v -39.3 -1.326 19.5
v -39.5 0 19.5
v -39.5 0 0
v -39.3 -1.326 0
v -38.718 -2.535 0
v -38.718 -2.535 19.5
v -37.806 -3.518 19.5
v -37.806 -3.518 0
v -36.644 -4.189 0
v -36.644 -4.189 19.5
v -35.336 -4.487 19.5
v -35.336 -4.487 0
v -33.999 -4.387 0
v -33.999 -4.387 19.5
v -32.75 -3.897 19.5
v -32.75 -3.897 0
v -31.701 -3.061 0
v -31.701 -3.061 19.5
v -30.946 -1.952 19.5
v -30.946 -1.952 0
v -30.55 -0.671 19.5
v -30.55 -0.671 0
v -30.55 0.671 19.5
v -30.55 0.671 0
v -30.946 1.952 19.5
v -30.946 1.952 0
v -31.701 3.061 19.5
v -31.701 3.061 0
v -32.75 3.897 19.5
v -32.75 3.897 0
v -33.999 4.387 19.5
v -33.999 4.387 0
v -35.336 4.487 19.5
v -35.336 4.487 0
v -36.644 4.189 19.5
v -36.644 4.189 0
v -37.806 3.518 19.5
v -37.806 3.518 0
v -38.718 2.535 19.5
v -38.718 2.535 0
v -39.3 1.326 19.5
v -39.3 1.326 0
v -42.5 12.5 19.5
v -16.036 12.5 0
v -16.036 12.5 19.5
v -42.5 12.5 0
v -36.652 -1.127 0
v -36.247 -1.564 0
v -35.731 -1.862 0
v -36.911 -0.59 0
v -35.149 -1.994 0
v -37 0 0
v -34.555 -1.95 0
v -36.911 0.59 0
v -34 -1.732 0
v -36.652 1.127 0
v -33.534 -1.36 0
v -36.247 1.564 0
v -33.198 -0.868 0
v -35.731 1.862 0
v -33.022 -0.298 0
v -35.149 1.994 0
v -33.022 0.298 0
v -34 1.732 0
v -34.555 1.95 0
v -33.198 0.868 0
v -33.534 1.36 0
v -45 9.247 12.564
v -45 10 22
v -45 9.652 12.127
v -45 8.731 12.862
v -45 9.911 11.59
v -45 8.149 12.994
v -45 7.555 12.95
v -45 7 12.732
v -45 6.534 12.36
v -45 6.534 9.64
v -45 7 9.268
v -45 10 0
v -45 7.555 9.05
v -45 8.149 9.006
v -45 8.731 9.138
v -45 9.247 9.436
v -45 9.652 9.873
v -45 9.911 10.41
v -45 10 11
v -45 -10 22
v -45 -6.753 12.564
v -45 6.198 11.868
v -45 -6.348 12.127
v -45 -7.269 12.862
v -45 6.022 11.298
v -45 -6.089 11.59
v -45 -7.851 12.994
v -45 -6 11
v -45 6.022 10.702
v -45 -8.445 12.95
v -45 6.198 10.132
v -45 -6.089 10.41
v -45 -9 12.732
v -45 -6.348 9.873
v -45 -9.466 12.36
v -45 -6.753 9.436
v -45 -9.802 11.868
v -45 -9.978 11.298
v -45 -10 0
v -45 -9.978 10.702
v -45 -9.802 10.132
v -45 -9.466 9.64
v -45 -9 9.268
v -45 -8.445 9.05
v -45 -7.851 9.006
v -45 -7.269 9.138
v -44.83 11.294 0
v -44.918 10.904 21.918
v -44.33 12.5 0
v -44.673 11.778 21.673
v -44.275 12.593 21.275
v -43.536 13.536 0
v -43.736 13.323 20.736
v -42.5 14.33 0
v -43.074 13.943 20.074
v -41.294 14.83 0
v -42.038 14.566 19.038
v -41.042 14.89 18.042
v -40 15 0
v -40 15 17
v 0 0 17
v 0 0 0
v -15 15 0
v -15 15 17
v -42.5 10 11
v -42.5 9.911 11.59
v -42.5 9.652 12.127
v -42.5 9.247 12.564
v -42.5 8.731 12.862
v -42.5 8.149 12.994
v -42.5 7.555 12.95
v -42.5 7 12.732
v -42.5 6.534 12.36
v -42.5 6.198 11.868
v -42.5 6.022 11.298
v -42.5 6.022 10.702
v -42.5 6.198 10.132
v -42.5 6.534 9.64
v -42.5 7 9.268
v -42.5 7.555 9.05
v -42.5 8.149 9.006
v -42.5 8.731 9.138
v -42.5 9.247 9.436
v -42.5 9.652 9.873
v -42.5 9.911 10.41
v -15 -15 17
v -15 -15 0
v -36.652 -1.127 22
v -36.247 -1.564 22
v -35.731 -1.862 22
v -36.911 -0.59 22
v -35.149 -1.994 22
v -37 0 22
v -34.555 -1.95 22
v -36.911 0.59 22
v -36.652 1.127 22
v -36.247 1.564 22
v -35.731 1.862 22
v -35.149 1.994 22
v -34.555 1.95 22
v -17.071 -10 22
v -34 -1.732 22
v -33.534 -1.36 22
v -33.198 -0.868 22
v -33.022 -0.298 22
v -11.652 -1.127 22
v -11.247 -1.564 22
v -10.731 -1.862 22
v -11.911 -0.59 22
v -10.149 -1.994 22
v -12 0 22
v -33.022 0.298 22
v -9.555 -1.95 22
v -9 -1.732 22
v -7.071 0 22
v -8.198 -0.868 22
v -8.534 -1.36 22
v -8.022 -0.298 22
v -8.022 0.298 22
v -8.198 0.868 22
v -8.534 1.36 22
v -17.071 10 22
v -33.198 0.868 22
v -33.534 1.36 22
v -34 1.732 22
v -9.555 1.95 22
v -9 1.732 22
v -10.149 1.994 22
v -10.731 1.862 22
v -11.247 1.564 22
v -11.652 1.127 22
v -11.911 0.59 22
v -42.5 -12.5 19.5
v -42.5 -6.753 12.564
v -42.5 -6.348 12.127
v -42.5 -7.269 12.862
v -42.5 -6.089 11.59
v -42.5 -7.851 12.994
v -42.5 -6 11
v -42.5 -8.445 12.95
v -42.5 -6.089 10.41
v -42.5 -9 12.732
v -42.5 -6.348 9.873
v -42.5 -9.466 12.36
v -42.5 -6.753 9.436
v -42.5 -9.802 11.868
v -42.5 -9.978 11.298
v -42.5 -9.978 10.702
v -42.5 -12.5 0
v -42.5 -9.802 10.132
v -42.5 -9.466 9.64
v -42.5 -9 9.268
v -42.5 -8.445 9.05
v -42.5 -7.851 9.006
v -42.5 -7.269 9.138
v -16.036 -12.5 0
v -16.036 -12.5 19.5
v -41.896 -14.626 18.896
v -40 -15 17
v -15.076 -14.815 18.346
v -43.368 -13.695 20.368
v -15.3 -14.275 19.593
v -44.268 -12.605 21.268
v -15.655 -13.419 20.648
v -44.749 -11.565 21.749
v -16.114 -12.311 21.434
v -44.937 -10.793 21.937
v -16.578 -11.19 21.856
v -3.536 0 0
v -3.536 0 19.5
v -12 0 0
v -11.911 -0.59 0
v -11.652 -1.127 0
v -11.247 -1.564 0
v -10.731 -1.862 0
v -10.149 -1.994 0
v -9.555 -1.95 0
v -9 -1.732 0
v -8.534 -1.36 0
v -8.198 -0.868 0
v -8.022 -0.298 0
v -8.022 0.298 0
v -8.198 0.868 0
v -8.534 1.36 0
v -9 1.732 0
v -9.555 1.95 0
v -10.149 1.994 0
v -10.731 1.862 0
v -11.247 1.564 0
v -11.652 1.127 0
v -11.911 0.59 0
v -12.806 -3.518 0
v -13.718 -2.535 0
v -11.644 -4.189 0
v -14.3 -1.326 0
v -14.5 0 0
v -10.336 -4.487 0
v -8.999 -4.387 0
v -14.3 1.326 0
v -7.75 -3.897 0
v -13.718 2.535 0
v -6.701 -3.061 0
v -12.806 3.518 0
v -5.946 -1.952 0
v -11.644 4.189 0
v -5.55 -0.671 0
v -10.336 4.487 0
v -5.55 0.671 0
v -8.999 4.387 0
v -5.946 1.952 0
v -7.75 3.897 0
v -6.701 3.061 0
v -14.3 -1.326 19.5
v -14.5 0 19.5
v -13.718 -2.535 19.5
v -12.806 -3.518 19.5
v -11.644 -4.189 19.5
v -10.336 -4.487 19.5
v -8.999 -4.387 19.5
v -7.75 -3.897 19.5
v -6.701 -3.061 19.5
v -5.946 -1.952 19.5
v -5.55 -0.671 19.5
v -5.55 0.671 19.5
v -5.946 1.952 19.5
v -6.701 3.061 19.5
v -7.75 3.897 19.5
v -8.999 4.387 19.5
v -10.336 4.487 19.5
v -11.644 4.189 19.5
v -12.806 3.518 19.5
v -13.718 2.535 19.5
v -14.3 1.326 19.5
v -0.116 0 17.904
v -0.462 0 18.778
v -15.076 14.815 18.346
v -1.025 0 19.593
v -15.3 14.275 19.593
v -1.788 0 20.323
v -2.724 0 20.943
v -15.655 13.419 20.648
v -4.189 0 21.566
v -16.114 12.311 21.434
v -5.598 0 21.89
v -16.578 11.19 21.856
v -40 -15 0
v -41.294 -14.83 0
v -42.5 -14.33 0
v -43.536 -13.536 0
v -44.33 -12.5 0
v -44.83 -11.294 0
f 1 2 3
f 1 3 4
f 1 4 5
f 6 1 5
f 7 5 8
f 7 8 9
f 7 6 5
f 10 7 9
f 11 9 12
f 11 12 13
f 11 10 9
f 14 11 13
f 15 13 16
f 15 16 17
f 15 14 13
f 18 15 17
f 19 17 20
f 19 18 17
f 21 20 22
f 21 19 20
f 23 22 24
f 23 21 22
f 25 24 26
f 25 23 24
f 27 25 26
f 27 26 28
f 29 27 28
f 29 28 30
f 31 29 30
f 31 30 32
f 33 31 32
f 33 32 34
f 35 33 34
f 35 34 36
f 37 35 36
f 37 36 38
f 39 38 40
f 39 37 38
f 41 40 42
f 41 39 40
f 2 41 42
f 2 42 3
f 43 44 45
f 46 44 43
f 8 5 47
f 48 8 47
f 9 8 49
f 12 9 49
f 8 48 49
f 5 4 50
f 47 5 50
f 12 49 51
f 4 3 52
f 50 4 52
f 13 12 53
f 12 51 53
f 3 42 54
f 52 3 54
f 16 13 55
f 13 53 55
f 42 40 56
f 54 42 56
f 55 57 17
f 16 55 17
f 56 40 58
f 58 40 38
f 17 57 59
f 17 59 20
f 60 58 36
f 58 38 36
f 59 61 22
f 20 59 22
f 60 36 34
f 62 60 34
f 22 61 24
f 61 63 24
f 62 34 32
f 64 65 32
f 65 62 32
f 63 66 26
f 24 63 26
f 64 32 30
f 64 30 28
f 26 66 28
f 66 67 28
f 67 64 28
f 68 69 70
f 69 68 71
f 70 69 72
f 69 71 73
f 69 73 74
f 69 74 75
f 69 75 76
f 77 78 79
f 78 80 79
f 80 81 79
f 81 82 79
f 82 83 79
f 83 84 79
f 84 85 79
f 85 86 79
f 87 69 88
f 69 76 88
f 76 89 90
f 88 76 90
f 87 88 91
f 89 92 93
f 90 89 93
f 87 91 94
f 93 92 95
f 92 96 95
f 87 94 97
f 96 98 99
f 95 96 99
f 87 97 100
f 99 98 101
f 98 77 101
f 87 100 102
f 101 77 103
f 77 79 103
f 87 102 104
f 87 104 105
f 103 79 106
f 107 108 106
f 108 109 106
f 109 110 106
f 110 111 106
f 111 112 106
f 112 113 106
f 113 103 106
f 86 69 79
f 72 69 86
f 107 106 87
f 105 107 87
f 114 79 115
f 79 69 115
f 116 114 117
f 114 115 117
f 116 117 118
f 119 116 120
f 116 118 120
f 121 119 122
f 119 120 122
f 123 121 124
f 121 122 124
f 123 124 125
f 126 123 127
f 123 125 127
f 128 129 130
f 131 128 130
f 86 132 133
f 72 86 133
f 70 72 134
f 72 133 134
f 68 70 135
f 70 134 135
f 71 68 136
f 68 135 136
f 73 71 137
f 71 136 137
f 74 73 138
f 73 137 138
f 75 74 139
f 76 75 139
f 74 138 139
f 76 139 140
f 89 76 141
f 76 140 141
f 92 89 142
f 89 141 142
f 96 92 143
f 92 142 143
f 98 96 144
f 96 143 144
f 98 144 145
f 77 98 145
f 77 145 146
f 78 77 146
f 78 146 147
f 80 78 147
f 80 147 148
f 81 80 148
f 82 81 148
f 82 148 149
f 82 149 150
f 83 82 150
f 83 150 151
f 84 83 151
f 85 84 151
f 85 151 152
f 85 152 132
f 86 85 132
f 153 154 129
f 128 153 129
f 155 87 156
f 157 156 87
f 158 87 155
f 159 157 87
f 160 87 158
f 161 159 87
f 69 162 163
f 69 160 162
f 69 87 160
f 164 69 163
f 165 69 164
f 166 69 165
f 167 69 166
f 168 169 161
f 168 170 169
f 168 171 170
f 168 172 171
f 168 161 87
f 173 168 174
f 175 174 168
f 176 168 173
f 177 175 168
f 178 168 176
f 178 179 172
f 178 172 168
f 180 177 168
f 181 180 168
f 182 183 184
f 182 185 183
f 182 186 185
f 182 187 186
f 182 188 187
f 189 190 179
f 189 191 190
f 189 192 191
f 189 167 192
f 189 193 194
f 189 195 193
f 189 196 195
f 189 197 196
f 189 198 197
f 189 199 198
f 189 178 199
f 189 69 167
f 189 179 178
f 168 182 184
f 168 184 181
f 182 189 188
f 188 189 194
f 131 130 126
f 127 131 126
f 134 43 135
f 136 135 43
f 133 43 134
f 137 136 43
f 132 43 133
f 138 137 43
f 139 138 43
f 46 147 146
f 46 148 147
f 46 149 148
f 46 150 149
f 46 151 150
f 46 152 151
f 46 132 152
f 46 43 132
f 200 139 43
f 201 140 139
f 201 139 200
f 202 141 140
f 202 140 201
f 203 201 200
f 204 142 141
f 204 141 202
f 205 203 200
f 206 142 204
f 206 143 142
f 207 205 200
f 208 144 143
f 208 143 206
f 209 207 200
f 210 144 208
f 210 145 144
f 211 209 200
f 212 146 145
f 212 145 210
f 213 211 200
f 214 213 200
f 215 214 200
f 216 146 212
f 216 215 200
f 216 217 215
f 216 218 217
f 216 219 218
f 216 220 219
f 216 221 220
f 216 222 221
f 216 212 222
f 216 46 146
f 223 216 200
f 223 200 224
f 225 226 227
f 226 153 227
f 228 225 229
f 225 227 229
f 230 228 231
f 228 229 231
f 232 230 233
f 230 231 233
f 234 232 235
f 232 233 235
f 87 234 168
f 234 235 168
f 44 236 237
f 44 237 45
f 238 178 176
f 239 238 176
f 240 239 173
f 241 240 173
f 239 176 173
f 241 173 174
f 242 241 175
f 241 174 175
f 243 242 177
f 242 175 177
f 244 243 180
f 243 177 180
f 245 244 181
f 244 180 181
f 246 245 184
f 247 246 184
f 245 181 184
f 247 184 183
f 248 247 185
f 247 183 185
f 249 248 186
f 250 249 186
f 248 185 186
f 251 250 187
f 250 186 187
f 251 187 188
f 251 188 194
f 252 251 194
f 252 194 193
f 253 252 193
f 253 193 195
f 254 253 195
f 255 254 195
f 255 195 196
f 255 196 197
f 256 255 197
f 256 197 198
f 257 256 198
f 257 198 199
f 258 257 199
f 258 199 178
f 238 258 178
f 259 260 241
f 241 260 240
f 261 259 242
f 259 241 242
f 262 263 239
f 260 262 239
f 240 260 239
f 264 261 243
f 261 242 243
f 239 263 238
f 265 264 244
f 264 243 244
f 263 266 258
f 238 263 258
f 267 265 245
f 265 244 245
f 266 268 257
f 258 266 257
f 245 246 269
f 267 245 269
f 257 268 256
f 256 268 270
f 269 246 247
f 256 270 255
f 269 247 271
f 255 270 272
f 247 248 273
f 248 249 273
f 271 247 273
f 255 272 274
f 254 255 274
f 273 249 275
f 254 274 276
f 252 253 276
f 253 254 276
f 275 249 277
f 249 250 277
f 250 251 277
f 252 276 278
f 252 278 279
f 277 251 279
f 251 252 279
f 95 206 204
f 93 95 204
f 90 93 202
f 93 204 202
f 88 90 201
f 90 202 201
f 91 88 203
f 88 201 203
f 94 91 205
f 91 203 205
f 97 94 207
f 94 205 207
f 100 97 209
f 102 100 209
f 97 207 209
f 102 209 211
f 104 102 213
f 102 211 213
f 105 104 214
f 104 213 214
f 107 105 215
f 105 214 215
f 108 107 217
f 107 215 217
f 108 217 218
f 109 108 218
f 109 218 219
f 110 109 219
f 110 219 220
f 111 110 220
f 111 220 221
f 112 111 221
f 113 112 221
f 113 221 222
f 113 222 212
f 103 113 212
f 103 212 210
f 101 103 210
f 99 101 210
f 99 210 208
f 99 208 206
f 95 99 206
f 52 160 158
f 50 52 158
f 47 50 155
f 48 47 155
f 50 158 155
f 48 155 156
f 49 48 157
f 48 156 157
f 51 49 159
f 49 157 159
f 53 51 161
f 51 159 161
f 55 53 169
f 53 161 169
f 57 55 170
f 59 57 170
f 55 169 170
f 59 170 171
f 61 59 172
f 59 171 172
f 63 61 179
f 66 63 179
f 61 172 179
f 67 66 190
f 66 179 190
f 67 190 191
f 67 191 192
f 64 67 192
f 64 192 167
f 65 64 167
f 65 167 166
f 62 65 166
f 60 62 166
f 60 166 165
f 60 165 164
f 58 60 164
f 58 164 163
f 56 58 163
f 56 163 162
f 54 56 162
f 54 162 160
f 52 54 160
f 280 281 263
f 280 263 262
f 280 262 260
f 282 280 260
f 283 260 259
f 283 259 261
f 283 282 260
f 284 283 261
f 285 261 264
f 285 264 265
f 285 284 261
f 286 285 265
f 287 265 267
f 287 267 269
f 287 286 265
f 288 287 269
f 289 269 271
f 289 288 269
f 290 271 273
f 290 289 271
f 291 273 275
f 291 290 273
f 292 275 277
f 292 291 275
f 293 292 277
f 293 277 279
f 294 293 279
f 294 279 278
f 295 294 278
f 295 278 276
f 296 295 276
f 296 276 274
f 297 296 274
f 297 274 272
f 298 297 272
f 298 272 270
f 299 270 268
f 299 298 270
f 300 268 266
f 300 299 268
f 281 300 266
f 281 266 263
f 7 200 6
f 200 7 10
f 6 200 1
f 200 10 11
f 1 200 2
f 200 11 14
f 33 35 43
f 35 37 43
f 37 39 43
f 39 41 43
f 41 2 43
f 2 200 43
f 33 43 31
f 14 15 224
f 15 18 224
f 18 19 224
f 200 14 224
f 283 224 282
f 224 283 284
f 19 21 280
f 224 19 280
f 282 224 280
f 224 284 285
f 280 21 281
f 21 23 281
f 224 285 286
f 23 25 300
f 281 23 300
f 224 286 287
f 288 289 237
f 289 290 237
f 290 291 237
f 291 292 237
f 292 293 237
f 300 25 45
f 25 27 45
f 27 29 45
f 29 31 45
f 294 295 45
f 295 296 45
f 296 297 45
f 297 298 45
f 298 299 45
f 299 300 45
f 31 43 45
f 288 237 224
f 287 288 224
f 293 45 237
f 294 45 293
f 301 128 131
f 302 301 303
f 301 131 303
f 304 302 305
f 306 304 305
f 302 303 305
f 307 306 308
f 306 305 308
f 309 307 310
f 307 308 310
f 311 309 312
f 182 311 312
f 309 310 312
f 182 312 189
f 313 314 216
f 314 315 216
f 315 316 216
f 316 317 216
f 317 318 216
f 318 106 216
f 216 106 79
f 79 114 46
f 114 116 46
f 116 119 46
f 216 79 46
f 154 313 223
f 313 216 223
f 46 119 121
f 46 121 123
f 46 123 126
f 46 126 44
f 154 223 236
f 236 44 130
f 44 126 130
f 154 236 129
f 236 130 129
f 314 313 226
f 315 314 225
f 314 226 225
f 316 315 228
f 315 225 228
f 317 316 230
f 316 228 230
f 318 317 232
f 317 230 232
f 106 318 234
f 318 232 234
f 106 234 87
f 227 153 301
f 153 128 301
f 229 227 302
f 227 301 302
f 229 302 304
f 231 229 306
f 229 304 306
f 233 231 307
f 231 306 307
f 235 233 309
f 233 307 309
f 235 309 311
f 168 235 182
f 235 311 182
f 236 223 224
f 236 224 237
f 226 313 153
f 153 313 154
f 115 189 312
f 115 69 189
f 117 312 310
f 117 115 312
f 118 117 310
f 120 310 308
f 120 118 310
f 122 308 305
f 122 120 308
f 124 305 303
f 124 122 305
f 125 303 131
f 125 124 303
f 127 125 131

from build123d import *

# Parameters (mm, degrees)
F1_DEPTH = 22
F2_D     = 4
F3_T     = -2.5
F5_D     = 4
F5_DEPTH = 6
F5_TIP   = 1.2017212381
F6_R     = 4.99999


# Not quite as in the source:
# - a fillet or chamfer is up to 0.001 mm smaller than in the source, because OpenCascade refuses the exact size


with BuildPart() as f1:
    # F0 (on Top) → F1 (new body)
    with BuildSketch(Plane.XY):
        Polygon((-15, -15), (0, 0), (-15, 15), (-45, 15), (-45, -15), align=None)
    extrude(amount=F1_DEPTH)

    # F2 (through all)
    with Locations(Plane(origin=(0, 0, 0), x_dir=(1, 0, 0), z_dir=(0, 0, -1))):
        with Locations((-35, 0), (-10, 0)):
            Hole(F2_D / 2)

    # F3
    f3_openings = [f1.faces().sort_by_distance(p)[0] for p in [
        (-26.079977, 0, 0),
    ]]
    offset(amount=F3_T, openings=f3_openings)

    # F5
    with Locations(Plane(origin=(-45, 0, 0), x_dir=(0, -1, 0), z_dir=(-1, 0, 0))):
        with Locations((-8, 11), (8, 11)):
            Hole(F5_D / 2, depth=F5_DEPTH)
            with Locations((0, 0, -(F5_DEPTH + F5_TIP / 2))):  # 118° drill point
                Cone(0, F5_D / 2, F5_TIP, mode=Mode.SUBTRACT)

    # F6 (radius 5 in the source; OpenCascade refuses exactly that, so slightly less here)
    f6_edges = [f1.edges().sort_by_distance(p)[0] for p in [
        (-30, -15, 22),
        (-7.5, -7.5, 22),
        (-7.5, 7.5, 22),
        (-30, 15, 22),
        (-45, 15, 11),
        (-45, -15, 11),
    ]]
    fillet(f6_edges, radius=F6_R)


solid = f1.part
